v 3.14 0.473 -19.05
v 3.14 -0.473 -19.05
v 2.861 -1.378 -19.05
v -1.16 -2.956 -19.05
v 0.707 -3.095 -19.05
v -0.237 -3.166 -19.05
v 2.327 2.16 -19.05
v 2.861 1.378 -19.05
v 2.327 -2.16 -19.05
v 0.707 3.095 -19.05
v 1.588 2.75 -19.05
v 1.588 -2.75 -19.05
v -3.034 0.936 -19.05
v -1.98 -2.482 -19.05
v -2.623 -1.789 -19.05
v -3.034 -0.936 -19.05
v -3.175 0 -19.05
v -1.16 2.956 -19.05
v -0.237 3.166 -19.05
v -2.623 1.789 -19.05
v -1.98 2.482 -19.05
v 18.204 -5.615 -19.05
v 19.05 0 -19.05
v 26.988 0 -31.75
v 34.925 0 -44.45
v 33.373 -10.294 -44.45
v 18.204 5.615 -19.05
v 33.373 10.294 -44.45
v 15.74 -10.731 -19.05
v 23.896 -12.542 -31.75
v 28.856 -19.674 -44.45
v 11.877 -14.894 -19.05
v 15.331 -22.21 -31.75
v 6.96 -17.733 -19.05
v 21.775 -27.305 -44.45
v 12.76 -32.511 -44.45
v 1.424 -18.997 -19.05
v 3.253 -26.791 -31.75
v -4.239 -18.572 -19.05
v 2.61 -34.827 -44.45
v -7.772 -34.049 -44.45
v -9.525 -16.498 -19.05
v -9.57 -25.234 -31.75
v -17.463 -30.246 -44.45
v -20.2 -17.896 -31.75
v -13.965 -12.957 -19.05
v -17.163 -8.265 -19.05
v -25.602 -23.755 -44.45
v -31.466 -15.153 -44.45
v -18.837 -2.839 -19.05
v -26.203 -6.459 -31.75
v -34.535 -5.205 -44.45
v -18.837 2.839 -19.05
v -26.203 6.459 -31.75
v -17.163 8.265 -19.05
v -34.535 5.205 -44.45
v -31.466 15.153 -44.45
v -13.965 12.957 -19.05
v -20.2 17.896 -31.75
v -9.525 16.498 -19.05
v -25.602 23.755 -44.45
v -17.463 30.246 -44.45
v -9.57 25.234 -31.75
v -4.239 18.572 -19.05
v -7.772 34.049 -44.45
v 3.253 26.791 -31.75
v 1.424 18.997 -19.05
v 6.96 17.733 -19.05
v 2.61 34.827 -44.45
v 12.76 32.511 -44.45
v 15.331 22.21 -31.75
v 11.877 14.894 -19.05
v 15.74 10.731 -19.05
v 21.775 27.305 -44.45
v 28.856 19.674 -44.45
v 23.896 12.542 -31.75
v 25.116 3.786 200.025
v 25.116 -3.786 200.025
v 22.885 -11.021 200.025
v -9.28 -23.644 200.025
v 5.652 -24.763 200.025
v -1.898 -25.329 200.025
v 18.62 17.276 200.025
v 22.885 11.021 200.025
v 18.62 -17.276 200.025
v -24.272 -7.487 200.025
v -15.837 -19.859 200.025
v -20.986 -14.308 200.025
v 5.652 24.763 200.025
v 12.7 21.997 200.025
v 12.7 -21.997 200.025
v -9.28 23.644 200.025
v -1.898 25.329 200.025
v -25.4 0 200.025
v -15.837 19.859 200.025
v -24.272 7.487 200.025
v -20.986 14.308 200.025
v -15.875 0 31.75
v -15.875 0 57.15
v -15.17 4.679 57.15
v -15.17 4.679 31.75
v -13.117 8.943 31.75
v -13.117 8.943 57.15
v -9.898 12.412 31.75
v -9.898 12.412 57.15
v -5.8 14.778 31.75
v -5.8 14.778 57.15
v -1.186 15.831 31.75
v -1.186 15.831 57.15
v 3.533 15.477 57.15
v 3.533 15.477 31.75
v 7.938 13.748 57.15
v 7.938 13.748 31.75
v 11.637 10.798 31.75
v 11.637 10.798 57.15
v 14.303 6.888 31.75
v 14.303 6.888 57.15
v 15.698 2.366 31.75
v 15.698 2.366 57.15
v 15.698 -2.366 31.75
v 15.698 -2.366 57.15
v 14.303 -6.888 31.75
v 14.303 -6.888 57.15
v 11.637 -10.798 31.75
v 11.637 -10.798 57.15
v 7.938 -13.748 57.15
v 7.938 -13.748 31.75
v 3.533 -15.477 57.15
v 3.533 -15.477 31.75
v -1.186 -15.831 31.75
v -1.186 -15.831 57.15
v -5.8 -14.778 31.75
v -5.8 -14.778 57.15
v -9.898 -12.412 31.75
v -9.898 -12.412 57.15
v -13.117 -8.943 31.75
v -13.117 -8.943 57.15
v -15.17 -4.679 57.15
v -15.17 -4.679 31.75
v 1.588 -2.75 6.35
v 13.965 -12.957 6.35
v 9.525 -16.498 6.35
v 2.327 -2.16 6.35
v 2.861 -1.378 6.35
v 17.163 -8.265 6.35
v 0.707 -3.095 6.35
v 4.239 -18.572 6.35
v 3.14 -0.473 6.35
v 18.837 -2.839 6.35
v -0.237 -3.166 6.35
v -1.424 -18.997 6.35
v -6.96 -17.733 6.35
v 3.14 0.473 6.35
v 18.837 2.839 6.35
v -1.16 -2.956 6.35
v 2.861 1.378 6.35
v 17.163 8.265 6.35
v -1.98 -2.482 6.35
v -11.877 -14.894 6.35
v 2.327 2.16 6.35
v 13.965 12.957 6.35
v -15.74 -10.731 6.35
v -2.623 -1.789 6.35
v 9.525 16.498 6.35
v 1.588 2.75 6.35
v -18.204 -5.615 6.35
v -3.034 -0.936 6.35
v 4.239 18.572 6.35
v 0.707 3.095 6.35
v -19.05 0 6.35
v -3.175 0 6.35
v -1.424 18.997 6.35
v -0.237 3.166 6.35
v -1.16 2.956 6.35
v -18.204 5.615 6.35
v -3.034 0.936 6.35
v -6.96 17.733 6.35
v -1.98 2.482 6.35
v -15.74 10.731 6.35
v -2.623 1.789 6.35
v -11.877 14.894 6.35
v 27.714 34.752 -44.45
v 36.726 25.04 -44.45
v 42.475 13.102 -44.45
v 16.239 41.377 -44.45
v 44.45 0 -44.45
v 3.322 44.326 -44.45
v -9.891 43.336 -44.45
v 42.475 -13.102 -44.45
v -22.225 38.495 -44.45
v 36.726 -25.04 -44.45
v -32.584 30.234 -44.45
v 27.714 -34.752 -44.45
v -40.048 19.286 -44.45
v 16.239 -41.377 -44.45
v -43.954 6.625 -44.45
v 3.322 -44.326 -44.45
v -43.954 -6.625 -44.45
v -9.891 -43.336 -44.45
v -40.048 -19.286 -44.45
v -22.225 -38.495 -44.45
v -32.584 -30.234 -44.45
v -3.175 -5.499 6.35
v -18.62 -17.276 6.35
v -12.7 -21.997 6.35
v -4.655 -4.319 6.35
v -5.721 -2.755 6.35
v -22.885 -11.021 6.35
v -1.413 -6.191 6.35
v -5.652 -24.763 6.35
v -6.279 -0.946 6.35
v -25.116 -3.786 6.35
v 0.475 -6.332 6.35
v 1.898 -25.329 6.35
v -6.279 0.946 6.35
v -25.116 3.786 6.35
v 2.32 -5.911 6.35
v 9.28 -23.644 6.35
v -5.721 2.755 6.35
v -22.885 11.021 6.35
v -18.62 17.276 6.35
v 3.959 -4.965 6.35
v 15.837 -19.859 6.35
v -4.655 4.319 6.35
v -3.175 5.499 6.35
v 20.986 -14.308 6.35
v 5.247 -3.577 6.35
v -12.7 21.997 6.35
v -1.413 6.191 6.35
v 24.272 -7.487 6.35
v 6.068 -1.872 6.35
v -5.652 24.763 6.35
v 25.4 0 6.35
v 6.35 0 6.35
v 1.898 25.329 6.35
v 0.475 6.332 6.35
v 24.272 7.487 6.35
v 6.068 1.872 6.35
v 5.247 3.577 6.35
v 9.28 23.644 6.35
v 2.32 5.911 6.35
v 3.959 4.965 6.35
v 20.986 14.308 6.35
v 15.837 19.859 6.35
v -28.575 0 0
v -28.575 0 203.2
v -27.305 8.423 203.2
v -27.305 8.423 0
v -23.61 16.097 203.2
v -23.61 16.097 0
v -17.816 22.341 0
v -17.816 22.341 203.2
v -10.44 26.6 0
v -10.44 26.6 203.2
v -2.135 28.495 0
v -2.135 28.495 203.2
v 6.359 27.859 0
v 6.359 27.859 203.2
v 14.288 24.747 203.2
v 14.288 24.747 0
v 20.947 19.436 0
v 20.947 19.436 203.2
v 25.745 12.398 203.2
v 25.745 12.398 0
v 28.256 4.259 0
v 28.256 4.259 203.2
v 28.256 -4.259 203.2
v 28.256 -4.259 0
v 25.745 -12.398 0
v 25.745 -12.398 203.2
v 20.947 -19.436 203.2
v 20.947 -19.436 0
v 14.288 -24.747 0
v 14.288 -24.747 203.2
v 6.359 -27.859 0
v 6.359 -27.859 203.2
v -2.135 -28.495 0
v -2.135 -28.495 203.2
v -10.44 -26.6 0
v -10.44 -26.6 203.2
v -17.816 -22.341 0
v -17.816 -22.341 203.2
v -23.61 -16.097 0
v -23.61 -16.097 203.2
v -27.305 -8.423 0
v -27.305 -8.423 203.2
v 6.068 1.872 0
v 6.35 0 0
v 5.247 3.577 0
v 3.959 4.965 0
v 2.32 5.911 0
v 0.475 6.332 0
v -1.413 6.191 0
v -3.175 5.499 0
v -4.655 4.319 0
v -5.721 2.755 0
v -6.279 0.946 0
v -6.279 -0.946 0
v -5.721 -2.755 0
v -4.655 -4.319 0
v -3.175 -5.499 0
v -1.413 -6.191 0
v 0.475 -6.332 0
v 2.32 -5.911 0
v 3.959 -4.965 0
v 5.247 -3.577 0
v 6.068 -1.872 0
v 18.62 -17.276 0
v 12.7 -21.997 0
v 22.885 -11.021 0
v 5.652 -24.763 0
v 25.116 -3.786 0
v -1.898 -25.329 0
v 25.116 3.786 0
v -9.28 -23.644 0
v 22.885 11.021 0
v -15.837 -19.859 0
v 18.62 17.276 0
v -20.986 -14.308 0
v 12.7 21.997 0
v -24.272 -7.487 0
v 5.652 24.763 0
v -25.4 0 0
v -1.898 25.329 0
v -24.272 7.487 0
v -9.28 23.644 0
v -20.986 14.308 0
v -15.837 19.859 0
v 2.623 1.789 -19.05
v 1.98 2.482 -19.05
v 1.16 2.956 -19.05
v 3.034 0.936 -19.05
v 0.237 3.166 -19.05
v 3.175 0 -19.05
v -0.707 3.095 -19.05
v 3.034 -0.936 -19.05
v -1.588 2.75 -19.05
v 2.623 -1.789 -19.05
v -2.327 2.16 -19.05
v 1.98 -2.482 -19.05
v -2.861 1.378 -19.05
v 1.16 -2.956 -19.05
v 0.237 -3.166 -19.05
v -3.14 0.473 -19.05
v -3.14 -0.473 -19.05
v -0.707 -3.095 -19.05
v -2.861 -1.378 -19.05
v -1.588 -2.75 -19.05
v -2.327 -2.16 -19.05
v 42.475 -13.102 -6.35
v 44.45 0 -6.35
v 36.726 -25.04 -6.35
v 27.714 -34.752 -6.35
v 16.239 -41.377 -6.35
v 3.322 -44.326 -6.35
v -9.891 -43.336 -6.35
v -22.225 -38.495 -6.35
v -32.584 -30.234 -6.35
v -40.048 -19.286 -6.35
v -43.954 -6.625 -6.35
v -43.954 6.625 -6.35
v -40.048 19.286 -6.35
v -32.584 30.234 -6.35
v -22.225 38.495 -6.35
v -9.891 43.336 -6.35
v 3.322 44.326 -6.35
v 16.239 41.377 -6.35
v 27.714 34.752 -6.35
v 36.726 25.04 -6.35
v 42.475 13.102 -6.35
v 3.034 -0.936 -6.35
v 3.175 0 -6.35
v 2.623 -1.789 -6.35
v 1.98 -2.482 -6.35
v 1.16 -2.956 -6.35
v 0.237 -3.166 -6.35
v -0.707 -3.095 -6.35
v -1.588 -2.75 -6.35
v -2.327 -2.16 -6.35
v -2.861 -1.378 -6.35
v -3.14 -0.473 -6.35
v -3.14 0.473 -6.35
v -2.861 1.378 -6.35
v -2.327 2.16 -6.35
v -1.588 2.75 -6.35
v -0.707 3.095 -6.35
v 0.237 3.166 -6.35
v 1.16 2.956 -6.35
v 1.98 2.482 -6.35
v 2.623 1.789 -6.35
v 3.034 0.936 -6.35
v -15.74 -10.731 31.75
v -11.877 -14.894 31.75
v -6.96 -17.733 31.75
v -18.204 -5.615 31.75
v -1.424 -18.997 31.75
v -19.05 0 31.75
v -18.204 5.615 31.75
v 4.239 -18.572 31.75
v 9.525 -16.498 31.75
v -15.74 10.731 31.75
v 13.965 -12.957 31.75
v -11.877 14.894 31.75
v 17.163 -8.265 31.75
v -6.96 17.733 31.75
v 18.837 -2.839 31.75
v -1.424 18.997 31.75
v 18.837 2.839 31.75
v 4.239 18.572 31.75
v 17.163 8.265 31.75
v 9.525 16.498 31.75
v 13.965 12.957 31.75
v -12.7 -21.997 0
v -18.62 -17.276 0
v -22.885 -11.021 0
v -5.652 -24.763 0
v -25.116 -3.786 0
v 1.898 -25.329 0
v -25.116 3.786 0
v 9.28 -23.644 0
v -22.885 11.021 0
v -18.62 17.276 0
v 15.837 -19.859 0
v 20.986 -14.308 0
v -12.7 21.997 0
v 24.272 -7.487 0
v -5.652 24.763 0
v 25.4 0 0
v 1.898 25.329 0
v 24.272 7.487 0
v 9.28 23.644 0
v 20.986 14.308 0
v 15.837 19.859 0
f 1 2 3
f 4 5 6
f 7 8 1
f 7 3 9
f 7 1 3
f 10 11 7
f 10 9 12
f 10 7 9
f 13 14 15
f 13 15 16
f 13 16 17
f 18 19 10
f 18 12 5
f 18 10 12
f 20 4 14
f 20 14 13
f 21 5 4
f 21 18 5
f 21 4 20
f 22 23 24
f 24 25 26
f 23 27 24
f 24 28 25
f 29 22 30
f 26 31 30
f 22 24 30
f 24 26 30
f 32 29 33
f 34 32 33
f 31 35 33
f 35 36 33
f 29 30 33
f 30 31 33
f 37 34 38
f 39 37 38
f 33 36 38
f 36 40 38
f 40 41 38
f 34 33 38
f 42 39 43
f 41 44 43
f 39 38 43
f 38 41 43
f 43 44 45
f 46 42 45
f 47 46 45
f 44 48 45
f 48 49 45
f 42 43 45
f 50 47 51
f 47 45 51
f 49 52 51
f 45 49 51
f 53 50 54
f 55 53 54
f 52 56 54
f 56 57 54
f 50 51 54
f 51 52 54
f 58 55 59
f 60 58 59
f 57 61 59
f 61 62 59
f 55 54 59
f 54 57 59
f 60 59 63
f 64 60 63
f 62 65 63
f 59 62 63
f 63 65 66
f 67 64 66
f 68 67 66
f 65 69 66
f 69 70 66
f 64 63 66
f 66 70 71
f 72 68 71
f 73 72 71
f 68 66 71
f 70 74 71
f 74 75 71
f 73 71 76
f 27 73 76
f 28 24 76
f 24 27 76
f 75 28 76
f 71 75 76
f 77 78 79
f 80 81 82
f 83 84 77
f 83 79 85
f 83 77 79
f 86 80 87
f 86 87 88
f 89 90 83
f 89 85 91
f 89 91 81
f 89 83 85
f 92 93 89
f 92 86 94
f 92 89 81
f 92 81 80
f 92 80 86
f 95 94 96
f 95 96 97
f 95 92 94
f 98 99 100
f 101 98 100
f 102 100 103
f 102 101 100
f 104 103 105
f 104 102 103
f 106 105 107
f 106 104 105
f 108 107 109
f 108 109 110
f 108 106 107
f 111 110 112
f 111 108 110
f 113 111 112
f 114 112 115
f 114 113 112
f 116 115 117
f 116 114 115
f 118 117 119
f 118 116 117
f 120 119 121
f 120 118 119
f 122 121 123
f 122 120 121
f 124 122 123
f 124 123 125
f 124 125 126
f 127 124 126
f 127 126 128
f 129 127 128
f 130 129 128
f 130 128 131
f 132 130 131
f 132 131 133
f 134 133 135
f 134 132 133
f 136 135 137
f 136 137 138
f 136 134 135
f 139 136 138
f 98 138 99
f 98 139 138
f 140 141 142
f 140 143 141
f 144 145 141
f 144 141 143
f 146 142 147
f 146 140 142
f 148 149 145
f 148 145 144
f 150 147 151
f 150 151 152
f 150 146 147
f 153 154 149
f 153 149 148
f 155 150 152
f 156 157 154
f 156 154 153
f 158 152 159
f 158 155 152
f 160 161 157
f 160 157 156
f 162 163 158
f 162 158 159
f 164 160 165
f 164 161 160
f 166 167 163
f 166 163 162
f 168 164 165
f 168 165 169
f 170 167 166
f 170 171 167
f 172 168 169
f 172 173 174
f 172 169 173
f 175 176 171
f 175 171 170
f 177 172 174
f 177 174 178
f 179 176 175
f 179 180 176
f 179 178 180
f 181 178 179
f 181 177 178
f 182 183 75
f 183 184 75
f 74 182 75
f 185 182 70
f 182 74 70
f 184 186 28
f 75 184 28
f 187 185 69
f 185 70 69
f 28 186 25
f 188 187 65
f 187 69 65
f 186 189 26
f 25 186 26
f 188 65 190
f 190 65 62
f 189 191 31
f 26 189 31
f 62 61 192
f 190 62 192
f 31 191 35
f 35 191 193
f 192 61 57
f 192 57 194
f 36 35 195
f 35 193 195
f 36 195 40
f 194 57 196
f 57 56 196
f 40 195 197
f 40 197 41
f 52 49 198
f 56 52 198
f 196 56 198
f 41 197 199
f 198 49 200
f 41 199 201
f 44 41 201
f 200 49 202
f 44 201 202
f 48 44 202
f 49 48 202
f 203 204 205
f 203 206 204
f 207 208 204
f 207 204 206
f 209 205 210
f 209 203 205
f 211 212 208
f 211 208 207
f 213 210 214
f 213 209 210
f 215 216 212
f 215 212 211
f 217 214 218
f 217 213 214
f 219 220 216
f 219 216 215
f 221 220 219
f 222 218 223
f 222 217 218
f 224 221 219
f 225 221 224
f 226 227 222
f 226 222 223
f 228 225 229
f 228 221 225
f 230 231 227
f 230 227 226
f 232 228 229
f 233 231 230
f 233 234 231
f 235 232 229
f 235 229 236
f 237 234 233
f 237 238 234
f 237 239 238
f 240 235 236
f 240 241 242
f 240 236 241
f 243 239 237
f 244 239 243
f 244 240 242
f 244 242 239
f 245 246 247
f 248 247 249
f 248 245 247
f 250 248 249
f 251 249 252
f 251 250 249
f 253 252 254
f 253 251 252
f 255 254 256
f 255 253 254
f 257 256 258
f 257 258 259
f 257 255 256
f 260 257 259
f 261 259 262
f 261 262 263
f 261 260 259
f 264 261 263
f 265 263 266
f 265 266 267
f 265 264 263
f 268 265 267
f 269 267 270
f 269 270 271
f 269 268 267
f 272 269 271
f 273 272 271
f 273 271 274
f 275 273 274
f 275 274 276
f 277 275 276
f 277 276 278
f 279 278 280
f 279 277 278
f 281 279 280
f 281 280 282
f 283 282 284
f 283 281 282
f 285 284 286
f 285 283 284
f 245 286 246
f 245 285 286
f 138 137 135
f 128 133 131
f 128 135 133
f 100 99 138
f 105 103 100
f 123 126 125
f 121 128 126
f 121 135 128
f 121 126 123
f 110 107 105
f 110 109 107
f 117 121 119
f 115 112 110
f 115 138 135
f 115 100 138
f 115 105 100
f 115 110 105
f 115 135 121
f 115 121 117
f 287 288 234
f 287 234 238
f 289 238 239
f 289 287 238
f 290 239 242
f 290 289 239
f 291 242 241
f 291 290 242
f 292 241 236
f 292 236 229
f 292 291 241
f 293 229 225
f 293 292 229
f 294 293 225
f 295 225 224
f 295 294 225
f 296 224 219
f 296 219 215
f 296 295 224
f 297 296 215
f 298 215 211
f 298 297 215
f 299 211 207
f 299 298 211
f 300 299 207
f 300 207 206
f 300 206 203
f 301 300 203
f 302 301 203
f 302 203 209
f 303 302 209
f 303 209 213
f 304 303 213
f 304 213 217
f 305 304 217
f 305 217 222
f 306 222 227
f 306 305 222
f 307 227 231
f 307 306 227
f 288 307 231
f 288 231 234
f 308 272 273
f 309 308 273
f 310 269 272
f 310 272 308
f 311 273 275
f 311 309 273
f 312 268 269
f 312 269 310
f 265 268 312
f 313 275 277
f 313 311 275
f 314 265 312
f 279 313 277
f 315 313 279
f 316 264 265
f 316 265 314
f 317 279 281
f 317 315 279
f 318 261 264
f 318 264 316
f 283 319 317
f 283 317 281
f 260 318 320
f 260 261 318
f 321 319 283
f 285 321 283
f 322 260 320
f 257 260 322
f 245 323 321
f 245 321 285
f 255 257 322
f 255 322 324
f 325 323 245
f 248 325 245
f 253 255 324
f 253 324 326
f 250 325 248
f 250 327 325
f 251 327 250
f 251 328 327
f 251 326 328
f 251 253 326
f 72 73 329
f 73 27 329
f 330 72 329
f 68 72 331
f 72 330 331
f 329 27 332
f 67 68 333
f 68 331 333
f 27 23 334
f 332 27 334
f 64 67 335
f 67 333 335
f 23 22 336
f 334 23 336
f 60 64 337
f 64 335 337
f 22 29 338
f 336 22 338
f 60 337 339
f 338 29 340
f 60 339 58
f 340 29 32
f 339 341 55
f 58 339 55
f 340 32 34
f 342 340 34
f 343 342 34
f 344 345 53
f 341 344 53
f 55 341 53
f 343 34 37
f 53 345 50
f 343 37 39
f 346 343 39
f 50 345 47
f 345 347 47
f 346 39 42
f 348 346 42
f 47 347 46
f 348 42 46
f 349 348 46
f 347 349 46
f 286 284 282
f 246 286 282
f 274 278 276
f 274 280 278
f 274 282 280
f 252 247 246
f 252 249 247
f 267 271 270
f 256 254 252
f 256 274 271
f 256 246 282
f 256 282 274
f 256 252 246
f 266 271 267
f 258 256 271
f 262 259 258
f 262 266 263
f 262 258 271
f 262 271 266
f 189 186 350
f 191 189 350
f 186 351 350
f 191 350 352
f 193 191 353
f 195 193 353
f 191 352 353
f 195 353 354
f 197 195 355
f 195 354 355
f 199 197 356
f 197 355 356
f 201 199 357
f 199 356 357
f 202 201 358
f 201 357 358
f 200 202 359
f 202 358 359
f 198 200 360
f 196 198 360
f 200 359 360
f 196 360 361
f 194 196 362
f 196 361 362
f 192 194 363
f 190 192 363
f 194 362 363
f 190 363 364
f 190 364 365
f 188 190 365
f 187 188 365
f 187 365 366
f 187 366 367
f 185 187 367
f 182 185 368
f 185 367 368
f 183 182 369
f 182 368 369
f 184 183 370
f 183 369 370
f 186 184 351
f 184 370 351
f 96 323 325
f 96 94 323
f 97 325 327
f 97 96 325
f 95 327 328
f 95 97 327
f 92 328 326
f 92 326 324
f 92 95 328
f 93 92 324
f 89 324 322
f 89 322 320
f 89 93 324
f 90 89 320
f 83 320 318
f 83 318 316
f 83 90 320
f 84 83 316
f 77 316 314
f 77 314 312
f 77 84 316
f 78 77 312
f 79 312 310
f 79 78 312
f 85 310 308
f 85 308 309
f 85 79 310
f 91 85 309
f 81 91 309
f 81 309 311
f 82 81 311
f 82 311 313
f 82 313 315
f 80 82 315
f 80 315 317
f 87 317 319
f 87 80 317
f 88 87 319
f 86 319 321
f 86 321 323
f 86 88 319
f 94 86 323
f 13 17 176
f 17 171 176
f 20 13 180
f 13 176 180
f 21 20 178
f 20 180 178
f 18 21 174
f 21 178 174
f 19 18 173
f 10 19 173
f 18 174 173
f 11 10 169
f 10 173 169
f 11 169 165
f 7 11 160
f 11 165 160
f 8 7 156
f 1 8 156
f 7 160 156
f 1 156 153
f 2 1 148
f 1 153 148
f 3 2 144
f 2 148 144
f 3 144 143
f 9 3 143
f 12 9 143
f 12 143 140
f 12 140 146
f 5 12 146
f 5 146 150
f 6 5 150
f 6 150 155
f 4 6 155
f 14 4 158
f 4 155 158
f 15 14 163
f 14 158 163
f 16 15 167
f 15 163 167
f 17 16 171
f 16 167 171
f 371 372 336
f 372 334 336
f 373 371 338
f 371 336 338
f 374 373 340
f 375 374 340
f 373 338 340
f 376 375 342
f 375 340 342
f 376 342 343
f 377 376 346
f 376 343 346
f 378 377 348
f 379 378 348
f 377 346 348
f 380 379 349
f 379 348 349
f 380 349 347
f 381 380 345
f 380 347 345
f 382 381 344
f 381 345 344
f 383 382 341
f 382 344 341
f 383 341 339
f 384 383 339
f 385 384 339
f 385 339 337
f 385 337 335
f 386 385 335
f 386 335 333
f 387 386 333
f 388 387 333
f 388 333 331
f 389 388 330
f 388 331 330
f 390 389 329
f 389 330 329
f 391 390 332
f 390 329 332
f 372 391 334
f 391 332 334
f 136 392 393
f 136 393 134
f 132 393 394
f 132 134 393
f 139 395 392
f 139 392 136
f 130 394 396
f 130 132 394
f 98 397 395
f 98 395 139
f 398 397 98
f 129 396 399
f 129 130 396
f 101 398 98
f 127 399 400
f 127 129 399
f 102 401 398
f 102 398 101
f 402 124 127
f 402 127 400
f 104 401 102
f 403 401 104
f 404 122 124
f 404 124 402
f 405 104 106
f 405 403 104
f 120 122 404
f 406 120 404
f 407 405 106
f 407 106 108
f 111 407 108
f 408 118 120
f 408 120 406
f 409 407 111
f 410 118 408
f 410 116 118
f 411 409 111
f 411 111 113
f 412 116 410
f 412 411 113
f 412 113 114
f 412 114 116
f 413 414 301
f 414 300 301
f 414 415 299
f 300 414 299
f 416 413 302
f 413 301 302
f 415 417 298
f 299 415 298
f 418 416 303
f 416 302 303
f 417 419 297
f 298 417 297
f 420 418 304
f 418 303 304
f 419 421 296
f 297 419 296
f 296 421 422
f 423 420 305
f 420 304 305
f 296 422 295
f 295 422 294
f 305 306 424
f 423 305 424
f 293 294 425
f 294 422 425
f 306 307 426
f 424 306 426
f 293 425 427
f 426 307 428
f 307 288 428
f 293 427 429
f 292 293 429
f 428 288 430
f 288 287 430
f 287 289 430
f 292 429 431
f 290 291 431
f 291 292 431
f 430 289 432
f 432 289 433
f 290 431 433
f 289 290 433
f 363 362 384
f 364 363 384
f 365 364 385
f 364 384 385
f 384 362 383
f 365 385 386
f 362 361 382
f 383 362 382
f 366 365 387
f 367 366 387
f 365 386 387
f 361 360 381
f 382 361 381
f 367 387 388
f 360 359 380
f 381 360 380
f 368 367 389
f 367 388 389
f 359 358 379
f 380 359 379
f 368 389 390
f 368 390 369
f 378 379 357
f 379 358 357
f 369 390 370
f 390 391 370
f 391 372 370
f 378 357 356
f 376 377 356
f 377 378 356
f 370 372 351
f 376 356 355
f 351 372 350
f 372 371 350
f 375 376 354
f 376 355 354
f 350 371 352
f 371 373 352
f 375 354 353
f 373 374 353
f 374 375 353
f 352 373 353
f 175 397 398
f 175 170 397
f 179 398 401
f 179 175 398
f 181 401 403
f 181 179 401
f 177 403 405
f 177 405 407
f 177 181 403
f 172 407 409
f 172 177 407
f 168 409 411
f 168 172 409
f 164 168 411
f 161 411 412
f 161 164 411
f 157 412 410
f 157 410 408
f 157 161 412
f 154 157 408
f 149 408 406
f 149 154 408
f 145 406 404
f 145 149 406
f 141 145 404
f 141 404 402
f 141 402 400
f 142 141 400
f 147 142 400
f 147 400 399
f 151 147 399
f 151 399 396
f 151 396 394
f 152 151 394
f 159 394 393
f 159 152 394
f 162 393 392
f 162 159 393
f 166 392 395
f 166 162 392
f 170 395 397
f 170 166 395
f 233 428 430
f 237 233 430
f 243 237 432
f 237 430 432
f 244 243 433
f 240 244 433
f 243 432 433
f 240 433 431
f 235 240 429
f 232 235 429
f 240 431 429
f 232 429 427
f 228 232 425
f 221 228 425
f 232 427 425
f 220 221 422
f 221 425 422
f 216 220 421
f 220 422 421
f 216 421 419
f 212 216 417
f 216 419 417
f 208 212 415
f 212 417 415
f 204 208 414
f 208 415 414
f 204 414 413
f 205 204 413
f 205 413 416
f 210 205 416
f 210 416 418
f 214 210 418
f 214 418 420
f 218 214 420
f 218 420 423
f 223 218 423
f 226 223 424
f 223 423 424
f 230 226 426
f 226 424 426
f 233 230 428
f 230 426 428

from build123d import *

# Parameters (mm, degrees)
F2_R     = 25.4
F2_R_2   = 6.35
F3_DEPTH = 6.35
F4_W     = 3.175
F4_H     = 25.4


with BuildPart() as f1:
    # F0 (on Front) → F1 (revolve)
    with BuildSketch(Plane.XZ):
        Polygon((-28.575, 0), (-25.4, 0), (-25.4, 200.025), (0, 200.025), (0, 203.2), (-28.575, 203.2), align=None)
    revolve(axis=Axis((0, 0, 100.0125), (0, 0, -1)))


with BuildPart() as f3:
    # F2 (on Top) → F3 (new body)
    with BuildSketch(Plane.XY):
        Circle(F2_R)
        Circle(F2_R_2, mode=Mode.SUBTRACT)
    extrude(amount=F3_DEPTH)


with BuildPart() as f5:
    # F4 (on Front) → F5 (revolve)
    with BuildSketch(Plane.XZ):
        Polygon((-3.175, 6.35), (0, 6.35), (0, 57.15), (-15.875, 57.15), (-15.875, 31.75), (-19.05, 31.75), (-19.05, 6.35), align=None)
        with Locations((-1.5875, -6.35)):
            Rectangle(F4_W, F4_H)
    revolve(axis=Axis((0, 0, 31.75), (0, 0, -1)))


with BuildPart() as f7:
    # F6 (on Front) → F7 (revolve)
    with BuildSketch(Plane.XZ):
        Polygon((44.45, -6.35), (3.175, -6.35), (3.175, -19.05), (19.05, -19.05), (34.925, -44.45), (44.45, -44.45), align=None)
    revolve(axis=Axis((0, 0, -31.75), (0, 0, -1)))


solid = Compound([f1.part, f3.part, f5.part, f7.part])
